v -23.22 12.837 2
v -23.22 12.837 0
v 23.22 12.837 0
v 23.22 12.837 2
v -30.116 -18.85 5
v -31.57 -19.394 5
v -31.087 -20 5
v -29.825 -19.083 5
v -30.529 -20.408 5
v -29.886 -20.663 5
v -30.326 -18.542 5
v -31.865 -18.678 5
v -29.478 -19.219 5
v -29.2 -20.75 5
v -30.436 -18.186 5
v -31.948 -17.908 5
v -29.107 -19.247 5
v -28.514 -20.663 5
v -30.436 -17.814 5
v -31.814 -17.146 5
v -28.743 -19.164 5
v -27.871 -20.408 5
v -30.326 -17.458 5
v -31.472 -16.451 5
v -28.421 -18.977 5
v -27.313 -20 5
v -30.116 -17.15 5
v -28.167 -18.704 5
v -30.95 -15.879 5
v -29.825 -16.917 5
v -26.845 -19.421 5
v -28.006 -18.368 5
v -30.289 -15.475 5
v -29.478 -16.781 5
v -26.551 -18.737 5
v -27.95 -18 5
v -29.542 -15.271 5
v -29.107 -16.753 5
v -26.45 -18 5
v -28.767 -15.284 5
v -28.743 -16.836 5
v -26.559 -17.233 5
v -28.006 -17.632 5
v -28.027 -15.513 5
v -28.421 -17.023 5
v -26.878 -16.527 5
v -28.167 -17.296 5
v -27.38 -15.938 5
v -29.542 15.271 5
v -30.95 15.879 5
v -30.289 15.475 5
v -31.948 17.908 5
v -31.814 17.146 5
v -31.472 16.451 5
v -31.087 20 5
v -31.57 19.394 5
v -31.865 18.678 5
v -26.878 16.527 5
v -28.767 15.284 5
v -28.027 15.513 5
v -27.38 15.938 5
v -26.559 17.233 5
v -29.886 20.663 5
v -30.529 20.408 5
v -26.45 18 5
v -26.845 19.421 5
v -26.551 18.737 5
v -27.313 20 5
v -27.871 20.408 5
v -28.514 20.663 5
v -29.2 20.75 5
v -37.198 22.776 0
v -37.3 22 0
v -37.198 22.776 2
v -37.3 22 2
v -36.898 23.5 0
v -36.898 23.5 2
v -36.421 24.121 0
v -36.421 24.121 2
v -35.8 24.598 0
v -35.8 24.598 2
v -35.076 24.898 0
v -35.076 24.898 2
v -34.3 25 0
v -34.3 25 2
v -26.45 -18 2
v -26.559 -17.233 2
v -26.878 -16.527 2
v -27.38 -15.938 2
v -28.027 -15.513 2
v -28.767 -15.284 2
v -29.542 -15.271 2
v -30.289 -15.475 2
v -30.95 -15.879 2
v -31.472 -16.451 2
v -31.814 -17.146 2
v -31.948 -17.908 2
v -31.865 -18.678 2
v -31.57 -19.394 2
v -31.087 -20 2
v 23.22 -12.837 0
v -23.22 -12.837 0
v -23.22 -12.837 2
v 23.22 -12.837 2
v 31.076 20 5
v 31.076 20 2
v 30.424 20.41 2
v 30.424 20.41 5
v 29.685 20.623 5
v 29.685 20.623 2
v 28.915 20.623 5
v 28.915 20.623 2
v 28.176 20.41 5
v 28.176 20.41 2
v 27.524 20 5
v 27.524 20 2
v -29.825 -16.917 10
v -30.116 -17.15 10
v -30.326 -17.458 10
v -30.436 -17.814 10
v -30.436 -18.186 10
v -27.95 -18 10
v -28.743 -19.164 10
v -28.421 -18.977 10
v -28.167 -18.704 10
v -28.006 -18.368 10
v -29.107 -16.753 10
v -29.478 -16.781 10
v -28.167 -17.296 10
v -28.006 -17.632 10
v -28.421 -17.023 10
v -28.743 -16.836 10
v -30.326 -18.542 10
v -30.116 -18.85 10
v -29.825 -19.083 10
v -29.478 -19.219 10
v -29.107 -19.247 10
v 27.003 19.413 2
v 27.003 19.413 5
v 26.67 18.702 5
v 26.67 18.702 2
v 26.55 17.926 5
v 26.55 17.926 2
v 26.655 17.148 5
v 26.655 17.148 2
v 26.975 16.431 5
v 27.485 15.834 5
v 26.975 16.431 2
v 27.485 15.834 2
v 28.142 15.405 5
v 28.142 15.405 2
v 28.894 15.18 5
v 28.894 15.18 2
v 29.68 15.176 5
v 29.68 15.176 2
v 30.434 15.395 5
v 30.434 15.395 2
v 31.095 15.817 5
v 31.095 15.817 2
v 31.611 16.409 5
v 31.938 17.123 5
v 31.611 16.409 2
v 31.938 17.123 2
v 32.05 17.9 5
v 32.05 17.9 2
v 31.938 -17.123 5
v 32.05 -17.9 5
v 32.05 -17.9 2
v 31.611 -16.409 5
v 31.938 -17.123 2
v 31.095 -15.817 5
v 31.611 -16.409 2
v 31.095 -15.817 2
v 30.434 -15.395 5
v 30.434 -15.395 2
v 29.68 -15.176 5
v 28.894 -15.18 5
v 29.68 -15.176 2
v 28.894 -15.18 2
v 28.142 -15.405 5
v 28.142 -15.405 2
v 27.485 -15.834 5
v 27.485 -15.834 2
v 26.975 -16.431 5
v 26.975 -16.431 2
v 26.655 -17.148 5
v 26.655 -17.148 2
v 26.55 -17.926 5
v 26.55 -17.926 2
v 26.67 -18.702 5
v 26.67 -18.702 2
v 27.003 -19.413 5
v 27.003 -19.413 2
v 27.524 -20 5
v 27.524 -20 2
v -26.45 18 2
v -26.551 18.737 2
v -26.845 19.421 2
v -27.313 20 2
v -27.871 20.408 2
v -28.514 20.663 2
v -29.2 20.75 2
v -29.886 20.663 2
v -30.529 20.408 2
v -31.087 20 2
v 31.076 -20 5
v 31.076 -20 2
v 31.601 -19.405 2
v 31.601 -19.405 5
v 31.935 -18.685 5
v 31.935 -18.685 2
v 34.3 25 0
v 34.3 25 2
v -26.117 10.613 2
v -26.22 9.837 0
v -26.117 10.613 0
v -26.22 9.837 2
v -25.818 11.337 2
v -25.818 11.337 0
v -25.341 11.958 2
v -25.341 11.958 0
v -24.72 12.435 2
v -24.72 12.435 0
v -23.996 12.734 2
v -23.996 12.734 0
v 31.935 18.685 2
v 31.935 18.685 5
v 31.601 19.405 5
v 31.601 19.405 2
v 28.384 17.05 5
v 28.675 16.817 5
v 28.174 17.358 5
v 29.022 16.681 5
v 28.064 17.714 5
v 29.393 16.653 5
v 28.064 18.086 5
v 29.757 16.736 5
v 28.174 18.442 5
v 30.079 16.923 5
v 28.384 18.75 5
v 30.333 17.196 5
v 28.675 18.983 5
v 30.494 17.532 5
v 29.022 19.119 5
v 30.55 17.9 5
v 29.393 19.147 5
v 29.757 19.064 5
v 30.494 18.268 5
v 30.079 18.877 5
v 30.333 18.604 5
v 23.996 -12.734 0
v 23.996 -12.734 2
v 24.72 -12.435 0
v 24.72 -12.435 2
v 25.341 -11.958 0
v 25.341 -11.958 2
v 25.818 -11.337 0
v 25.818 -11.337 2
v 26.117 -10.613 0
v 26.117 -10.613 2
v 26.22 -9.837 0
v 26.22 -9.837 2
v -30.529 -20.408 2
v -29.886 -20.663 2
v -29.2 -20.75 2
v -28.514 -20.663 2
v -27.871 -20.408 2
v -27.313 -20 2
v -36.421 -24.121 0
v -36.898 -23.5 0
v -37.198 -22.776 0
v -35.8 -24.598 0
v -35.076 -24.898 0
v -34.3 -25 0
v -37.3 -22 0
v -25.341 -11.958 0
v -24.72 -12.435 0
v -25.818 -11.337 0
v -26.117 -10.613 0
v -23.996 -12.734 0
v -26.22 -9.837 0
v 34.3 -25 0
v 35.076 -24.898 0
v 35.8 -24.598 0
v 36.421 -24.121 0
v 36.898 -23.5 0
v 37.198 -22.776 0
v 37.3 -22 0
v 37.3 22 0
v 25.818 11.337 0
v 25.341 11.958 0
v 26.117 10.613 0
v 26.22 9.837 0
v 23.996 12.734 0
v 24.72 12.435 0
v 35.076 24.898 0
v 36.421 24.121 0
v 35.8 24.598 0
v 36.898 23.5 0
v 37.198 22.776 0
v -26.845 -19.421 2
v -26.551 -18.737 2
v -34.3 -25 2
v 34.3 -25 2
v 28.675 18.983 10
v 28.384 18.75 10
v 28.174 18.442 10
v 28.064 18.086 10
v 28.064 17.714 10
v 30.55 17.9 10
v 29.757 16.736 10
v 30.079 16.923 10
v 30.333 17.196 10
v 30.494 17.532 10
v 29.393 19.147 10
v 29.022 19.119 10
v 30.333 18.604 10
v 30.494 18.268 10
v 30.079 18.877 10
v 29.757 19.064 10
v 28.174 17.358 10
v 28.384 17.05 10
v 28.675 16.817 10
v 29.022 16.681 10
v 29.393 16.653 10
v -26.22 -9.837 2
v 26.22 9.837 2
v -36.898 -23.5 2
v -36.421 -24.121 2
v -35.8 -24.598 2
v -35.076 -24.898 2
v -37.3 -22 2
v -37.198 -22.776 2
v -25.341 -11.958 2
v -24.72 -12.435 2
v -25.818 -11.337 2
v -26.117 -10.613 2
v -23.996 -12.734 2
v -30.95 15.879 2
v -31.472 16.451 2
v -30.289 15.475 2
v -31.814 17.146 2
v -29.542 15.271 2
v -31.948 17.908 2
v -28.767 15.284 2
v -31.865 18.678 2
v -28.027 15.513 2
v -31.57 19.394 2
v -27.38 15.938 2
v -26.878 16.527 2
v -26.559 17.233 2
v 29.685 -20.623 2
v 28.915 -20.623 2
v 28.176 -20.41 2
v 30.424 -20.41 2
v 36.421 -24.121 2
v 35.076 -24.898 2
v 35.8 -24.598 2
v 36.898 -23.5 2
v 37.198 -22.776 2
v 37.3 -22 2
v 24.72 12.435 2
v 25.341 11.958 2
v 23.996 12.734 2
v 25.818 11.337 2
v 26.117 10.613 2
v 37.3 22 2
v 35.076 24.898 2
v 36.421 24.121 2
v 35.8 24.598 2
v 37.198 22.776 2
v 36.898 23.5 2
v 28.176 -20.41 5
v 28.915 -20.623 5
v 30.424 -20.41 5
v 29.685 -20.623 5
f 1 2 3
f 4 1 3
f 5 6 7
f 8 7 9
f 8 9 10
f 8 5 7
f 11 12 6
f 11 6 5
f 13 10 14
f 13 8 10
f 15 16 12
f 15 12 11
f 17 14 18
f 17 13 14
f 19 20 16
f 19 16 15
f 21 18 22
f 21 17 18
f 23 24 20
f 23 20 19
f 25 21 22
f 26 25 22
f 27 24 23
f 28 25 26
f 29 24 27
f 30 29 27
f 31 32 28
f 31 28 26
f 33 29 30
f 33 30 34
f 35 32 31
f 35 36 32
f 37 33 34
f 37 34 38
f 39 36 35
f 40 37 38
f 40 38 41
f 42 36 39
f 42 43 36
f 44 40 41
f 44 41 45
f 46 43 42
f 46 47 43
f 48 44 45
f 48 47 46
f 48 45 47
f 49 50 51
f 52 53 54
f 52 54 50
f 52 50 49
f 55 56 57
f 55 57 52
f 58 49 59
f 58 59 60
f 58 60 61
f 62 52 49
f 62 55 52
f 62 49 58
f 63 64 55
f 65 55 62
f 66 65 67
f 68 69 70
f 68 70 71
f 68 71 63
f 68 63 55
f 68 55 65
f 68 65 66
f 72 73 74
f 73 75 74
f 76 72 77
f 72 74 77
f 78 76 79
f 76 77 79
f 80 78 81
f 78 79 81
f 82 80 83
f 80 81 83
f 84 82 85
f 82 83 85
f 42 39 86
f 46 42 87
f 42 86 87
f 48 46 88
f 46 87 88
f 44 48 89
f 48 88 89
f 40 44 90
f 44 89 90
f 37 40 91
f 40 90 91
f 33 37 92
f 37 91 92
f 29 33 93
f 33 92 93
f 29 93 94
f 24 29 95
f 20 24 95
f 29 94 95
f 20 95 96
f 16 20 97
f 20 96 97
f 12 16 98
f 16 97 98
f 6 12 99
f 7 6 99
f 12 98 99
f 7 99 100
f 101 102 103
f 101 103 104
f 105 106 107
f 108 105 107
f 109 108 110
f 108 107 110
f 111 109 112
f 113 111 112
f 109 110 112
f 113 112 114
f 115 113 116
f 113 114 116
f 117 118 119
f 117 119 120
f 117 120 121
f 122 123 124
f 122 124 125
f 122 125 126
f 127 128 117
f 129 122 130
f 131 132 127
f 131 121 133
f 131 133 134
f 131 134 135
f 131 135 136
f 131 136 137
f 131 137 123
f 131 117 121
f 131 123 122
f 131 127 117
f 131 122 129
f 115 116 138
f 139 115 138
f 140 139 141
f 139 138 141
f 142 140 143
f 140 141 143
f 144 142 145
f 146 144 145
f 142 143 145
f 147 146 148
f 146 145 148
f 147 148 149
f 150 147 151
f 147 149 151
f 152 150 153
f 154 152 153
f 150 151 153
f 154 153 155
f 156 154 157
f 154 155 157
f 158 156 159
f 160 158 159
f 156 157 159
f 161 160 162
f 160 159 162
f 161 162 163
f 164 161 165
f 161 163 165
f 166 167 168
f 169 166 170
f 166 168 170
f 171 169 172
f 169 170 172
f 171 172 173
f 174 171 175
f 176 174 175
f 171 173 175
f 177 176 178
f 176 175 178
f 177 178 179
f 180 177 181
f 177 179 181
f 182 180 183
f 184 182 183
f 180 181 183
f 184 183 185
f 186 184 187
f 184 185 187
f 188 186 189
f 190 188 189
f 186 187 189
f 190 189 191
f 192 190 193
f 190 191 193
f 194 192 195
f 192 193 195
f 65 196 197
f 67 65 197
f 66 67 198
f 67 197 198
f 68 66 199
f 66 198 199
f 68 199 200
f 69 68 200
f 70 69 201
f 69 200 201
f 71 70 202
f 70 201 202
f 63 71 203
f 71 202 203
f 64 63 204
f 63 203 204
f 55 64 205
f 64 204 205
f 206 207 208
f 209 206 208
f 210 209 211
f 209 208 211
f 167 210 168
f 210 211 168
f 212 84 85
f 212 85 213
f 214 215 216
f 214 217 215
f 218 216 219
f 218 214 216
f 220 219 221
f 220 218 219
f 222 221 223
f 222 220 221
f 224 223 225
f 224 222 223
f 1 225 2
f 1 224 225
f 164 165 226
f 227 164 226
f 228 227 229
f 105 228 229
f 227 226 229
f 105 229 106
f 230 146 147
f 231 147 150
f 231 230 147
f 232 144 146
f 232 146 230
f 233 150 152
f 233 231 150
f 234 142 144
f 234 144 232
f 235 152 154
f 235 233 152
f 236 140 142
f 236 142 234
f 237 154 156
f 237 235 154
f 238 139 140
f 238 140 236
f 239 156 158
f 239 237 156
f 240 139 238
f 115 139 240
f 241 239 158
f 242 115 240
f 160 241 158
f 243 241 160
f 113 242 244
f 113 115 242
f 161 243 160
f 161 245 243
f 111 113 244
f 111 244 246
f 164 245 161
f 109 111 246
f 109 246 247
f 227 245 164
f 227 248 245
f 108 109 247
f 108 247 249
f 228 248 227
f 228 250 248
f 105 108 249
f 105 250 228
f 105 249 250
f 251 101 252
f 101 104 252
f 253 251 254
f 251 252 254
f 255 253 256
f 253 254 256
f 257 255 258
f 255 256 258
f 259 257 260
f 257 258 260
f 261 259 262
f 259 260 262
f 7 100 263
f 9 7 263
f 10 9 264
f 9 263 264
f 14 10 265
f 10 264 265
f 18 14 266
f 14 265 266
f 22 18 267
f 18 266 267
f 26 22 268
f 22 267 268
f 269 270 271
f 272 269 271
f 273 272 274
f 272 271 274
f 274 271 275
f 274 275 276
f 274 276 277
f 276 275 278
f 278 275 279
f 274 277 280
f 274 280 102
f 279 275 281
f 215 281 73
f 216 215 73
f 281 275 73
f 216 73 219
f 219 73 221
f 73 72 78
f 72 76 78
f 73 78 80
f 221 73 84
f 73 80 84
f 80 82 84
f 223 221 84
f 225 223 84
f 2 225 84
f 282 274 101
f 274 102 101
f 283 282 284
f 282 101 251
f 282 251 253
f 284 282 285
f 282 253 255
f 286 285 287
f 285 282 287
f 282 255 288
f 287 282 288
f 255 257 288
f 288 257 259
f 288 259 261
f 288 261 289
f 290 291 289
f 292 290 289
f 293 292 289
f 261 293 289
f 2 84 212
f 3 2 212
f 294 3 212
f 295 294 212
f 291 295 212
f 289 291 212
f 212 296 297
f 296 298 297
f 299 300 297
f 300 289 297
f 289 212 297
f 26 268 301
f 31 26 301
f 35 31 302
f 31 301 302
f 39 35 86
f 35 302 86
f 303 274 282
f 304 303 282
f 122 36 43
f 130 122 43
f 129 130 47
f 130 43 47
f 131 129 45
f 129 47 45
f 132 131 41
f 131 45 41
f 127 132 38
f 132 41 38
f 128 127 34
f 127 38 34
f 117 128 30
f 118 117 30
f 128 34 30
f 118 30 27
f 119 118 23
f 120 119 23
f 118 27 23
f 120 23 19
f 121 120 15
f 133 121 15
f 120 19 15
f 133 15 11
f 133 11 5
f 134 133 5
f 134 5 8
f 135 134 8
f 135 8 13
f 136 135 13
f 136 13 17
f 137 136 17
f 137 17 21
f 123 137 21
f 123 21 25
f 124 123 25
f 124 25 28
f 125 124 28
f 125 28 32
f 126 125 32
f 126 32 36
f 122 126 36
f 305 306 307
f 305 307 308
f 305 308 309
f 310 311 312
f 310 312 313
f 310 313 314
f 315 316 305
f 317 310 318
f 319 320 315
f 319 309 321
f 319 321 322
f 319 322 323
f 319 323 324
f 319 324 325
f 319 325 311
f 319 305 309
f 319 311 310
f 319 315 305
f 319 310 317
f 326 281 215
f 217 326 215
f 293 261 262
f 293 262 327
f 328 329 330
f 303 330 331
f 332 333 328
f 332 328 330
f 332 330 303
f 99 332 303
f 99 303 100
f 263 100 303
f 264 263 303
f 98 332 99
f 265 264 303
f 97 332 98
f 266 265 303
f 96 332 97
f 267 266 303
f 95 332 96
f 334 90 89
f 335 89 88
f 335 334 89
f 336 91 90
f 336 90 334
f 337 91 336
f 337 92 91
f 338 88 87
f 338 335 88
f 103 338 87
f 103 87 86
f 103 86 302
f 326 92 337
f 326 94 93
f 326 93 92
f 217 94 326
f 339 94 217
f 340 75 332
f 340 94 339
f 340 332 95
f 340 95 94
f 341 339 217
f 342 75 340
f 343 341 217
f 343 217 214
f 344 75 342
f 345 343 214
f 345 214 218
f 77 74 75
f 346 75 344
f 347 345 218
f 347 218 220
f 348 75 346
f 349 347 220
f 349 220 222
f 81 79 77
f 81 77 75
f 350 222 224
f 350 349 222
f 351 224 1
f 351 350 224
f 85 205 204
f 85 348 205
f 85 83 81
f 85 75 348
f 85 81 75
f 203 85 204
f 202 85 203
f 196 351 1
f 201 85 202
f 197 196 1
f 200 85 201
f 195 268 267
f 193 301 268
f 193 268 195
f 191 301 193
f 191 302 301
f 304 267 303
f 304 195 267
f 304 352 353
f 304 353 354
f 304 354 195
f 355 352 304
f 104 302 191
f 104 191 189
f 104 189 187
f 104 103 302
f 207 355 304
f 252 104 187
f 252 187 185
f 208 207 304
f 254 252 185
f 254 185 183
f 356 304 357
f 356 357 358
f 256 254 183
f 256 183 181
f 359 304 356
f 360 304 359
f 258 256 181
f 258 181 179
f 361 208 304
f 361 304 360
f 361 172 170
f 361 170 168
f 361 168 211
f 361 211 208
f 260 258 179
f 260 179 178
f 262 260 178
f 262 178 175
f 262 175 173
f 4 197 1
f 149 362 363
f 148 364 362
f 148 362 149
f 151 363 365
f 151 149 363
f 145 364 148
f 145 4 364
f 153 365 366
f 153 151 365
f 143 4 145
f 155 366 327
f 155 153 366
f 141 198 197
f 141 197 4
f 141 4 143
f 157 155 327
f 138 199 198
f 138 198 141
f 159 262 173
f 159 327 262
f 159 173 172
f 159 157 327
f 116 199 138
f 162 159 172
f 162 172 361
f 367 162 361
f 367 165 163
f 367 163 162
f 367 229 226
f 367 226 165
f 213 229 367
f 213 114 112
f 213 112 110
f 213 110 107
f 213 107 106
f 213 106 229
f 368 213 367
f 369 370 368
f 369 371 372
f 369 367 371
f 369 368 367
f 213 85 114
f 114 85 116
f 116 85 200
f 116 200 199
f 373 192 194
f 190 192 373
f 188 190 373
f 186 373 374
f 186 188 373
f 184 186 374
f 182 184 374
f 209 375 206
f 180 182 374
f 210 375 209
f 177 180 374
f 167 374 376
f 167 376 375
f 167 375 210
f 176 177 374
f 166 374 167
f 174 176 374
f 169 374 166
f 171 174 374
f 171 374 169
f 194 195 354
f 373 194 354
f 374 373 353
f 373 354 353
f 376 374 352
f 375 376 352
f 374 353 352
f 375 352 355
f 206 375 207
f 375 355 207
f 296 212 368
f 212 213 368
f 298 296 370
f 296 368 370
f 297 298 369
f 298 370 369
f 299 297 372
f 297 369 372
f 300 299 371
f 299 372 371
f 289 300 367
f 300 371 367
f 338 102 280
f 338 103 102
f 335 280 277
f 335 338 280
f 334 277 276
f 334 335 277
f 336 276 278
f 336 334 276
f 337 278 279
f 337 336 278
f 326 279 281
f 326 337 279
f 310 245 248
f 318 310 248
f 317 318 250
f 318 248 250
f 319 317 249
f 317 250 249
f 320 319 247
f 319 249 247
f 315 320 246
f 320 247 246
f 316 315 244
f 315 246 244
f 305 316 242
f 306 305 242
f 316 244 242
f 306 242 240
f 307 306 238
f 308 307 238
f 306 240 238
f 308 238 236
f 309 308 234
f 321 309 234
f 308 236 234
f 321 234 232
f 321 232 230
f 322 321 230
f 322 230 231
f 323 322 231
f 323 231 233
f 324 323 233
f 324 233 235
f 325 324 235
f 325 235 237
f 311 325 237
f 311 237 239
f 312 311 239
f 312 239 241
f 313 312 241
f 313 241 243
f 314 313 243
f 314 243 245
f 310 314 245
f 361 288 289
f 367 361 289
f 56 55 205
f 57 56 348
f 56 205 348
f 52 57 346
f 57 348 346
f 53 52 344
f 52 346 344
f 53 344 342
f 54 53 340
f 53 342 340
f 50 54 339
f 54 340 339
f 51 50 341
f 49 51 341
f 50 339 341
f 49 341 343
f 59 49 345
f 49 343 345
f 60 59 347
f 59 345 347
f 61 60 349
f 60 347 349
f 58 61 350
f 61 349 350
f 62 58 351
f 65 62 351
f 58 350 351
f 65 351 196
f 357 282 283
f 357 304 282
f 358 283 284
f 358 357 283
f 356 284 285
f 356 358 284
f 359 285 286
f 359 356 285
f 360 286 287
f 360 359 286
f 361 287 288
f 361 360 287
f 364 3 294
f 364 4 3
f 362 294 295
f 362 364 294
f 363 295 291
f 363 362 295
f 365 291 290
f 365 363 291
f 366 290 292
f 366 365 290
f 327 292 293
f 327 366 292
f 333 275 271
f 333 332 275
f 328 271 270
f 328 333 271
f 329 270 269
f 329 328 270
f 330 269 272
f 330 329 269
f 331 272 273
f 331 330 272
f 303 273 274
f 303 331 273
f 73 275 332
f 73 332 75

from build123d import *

# Parameters (mm, degrees)
F0_W     = 74.6
F0_H     = 50
F0_W_2   = 52.4393096566
F0_H_2   = 25.6734117866
F0_R     = 1.25
F1_DEPTH = 2
F2_DEPTH = 5
F3_DEPTH = 10
F4_R     = 3
F5_R     = 3


with BuildPart() as f1:
    # F0 (on Top) → F1 (new body)
    with BuildSketch(Plane.XY):
        Rectangle(F0_W, F0_H)
        with BuildLine():
            Line((-32.3, -20), (-32.3, 20))
            Line((-32.3, 20), (-31.0874586088, 20))
            ThreePointArc((-31.0874586088, 20), (-29.2, 20.75), (-27.3125413912, 20))
            Line((-27.3125413912, 20), (27.5244719095, 20))
            ThreePointArc((27.5244719095, 20), (29.3, 20.65), (31.0755280905, 20))
            Line((31.0755280905, 20), (32.3, 20))
            Line((32.3, 20), (32.3, -20))
            Line((32.3, -20), (31.0755280905, -20))
            ThreePointArc((31.0755280905, -20), (29.3, -20.65), (27.5244719095, -20))
            Line((27.5244719095, -20), (-27.3125413912, -20))
            ThreePointArc((-27.3125413912, -20), (-29.2, -20.75), (-31.0874586088, -20))
            Line((-31.0874586088, -20), (-32.3, -20))
        make_face(mode=Mode.SUBTRACT)
        with BuildLine():
            Line((-31.0874586088, 20), (-32.3, 20))
            Line((-32.3, 20), (-32.3, -20))
            Line((-32.3, -20), (-31.0874586088, -20))
            ThreePointArc((-31.0874586088, -20), (-30.289033706, -15.4748256323), (-26.45, -18))
            ThreePointArc((-26.45, -18), (-26.6748256323, -19.089033706), (-27.3125413912, -20))
            Line((-27.3125413912, -20), (27.5244719095, -20))
            ThreePointArc((27.5244719095, -20), (28.1424599896, -15.4054857939), (32.05, -17.9))
            ThreePointArc((32.05, -17.9), (31.7945142061, -19.0575400104), (31.0755280905, -20))
            Line((31.0755280905, -20), (32.3, -20))
            Line((32.3, -20), (32.3, 20))
            Line((32.3, 20), (31.0755280905, 20))
            ThreePointArc((31.0755280905, 20), (31.7945142061, 19.0575400104), (32.05, 17.9))
            ThreePointArc((32.05, 17.9), (28.1424599896, 15.4054857939), (27.5244719095, 20))
            Line((27.5244719095, 20), (-27.3125413912, 20))
            ThreePointArc((-27.3125413912, 20), (-26.6748256323, 19.089033706), (-26.45, 18))
            ThreePointArc((-26.45, 18), (-30.289033706, 15.4748256323), (-31.0874586088, 20))
        make_face()
        Rectangle(F0_W_2, F0_H_2, mode=Mode.SUBTRACT)
        with BuildLine():
            Line((31.0755280905, 20), (27.5244719095, 20))
            ThreePointArc((27.5244719095, 20), (28.1424599896, 15.4054857939), (32.05, 17.9))
            ThreePointArc((32.05, 17.9), (31.7945142061, 19.0575400104), (31.0755280905, 20))
        make_face()
        with Locations((29.3, 17.9)):
            Circle(F0_R, mode=Mode.SUBTRACT)
        with BuildLine():
            ThreePointArc((-26.45, -18), (-30.289033706, -15.4748256323), (-31.0874586088, -20))
            Line((-31.0874586088, -20), (-27.3125413912, -20))
            ThreePointArc((-27.3125413912, -20), (-26.6748256323, -19.089033706), (-26.45, -18))
        make_face()
        with Locations((-29.2, -18)):
            Circle(F0_R, mode=Mode.SUBTRACT)
        with Locations((-29.2, -18)):
            Circle(F0_R)
        with Locations((29.3, 17.9)):
            Circle(F0_R)
        with BuildLine():
            Line((-27.3125413912, -20), (-31.0874586088, -20))
            ThreePointArc((-31.0874586088, -20), (-29.2, -20.75), (-27.3125413912, -20))
        make_face()
    extrude(amount=F1_DEPTH)

    # F0 (on Top) → F2 (join)
    with BuildSketch(Plane.XY):
        with BuildLine():
            ThreePointArc((31.0755280905, 20), (29.3, 20.65), (27.5244719095, 20))
            Line((27.5244719095, 20), (31.0755280905, 20))
        make_face()
        with BuildLine():
            Line((31.0755280905, 20), (27.5244719095, 20))
            ThreePointArc((27.5244719095, 20), (28.1424599896, 15.4054857939), (32.05, 17.9))
            ThreePointArc((32.05, 17.9), (31.7945142061, 19.0575400104), (31.0755280905, 20))
        make_face()
        with Locations((29.3, 17.9)):
            Circle(F0_R, mode=Mode.SUBTRACT)
        with Locations((29.3, 17.9)):
            Circle(F0_R)
        with BuildLine():
            ThreePointArc((-26.45, -18), (-30.289033706, -15.4748256323), (-31.0874586088, -20))
            Line((-31.0874586088, -20), (-27.3125413912, -20))
            ThreePointArc((-27.3125413912, -20), (-26.6748256323, -19.089033706), (-26.45, -18))
        make_face()
        with Locations((-29.2, -18)):
            Circle(F0_R, mode=Mode.SUBTRACT)
        with Locations((-29.2, -18)):
            Circle(F0_R)
        with BuildLine():
            Line((-27.3125413912, -20), (-31.0874586088, -20))
            ThreePointArc((-31.0874586088, -20), (-29.2, -20.75), (-27.3125413912, -20))
        make_face()
        with BuildLine():
            Line((-27.3125413912, 20), (-31.0874586088, 20))
            ThreePointArc((-31.0874586088, 20), (-30.289033706, 15.4748256323), (-26.45, 18))
            ThreePointArc((-26.45, 18), (-26.6748256323, 19.089033706), (-27.3125413912, 20))
        make_face()
        with BuildLine():
            ThreePointArc((-27.3125413912, 20), (-29.2, 20.75), (-31.0874586088, 20))
            Line((-31.0874586088, 20), (-27.3125413912, 20))
        make_face()
        with BuildLine():
            ThreePointArc((32.05, -17.9), (28.1424599896, -15.4054857939), (27.5244719095, -20))
            Line((27.5244719095, -20), (31.0755280905, -20))
            ThreePointArc((31.0755280905, -20), (31.7945142061, -19.0575400104), (32.05, -17.9))
        make_face()
        with BuildLine():
            Line((31.0755280905, -20), (27.5244719095, -20))
            ThreePointArc((27.5244719095, -20), (29.3, -20.65), (31.0755280905, -20))
        make_face()
    extrude(amount=F2_DEPTH)

    # F0 (on Top) → F3 (join)
    with BuildSketch(Plane.XY):
        with Locations((29.3, 17.9)):
            Circle(F0_R)
        with Locations((-29.2, -18)):
            Circle(F0_R)
    extrude(amount=F3_DEPTH)

    # F4
    f4_edges = [f1.edges().sort_by_distance(p)[0] for p in [
        (37.3, 25, 1),
        (37.3, -25, 1),
        (-37.3, -25, 1),
        (-37.3, 25, 1),
    ]]
    fillet(f4_edges, radius=F4_R)

    # F5
    f5_edges = [f1.edges().sort_by_distance(p)[0] for p in [
        (-26.219655, 12.836706, 1),
        (26.219655, 12.836706, 1),
        (26.219655, -12.836706, 1),
        (-26.219655, -12.836706, 1),
    ]]
    fillet(f5_edges, radius=F5_R)


solid = f1.part
